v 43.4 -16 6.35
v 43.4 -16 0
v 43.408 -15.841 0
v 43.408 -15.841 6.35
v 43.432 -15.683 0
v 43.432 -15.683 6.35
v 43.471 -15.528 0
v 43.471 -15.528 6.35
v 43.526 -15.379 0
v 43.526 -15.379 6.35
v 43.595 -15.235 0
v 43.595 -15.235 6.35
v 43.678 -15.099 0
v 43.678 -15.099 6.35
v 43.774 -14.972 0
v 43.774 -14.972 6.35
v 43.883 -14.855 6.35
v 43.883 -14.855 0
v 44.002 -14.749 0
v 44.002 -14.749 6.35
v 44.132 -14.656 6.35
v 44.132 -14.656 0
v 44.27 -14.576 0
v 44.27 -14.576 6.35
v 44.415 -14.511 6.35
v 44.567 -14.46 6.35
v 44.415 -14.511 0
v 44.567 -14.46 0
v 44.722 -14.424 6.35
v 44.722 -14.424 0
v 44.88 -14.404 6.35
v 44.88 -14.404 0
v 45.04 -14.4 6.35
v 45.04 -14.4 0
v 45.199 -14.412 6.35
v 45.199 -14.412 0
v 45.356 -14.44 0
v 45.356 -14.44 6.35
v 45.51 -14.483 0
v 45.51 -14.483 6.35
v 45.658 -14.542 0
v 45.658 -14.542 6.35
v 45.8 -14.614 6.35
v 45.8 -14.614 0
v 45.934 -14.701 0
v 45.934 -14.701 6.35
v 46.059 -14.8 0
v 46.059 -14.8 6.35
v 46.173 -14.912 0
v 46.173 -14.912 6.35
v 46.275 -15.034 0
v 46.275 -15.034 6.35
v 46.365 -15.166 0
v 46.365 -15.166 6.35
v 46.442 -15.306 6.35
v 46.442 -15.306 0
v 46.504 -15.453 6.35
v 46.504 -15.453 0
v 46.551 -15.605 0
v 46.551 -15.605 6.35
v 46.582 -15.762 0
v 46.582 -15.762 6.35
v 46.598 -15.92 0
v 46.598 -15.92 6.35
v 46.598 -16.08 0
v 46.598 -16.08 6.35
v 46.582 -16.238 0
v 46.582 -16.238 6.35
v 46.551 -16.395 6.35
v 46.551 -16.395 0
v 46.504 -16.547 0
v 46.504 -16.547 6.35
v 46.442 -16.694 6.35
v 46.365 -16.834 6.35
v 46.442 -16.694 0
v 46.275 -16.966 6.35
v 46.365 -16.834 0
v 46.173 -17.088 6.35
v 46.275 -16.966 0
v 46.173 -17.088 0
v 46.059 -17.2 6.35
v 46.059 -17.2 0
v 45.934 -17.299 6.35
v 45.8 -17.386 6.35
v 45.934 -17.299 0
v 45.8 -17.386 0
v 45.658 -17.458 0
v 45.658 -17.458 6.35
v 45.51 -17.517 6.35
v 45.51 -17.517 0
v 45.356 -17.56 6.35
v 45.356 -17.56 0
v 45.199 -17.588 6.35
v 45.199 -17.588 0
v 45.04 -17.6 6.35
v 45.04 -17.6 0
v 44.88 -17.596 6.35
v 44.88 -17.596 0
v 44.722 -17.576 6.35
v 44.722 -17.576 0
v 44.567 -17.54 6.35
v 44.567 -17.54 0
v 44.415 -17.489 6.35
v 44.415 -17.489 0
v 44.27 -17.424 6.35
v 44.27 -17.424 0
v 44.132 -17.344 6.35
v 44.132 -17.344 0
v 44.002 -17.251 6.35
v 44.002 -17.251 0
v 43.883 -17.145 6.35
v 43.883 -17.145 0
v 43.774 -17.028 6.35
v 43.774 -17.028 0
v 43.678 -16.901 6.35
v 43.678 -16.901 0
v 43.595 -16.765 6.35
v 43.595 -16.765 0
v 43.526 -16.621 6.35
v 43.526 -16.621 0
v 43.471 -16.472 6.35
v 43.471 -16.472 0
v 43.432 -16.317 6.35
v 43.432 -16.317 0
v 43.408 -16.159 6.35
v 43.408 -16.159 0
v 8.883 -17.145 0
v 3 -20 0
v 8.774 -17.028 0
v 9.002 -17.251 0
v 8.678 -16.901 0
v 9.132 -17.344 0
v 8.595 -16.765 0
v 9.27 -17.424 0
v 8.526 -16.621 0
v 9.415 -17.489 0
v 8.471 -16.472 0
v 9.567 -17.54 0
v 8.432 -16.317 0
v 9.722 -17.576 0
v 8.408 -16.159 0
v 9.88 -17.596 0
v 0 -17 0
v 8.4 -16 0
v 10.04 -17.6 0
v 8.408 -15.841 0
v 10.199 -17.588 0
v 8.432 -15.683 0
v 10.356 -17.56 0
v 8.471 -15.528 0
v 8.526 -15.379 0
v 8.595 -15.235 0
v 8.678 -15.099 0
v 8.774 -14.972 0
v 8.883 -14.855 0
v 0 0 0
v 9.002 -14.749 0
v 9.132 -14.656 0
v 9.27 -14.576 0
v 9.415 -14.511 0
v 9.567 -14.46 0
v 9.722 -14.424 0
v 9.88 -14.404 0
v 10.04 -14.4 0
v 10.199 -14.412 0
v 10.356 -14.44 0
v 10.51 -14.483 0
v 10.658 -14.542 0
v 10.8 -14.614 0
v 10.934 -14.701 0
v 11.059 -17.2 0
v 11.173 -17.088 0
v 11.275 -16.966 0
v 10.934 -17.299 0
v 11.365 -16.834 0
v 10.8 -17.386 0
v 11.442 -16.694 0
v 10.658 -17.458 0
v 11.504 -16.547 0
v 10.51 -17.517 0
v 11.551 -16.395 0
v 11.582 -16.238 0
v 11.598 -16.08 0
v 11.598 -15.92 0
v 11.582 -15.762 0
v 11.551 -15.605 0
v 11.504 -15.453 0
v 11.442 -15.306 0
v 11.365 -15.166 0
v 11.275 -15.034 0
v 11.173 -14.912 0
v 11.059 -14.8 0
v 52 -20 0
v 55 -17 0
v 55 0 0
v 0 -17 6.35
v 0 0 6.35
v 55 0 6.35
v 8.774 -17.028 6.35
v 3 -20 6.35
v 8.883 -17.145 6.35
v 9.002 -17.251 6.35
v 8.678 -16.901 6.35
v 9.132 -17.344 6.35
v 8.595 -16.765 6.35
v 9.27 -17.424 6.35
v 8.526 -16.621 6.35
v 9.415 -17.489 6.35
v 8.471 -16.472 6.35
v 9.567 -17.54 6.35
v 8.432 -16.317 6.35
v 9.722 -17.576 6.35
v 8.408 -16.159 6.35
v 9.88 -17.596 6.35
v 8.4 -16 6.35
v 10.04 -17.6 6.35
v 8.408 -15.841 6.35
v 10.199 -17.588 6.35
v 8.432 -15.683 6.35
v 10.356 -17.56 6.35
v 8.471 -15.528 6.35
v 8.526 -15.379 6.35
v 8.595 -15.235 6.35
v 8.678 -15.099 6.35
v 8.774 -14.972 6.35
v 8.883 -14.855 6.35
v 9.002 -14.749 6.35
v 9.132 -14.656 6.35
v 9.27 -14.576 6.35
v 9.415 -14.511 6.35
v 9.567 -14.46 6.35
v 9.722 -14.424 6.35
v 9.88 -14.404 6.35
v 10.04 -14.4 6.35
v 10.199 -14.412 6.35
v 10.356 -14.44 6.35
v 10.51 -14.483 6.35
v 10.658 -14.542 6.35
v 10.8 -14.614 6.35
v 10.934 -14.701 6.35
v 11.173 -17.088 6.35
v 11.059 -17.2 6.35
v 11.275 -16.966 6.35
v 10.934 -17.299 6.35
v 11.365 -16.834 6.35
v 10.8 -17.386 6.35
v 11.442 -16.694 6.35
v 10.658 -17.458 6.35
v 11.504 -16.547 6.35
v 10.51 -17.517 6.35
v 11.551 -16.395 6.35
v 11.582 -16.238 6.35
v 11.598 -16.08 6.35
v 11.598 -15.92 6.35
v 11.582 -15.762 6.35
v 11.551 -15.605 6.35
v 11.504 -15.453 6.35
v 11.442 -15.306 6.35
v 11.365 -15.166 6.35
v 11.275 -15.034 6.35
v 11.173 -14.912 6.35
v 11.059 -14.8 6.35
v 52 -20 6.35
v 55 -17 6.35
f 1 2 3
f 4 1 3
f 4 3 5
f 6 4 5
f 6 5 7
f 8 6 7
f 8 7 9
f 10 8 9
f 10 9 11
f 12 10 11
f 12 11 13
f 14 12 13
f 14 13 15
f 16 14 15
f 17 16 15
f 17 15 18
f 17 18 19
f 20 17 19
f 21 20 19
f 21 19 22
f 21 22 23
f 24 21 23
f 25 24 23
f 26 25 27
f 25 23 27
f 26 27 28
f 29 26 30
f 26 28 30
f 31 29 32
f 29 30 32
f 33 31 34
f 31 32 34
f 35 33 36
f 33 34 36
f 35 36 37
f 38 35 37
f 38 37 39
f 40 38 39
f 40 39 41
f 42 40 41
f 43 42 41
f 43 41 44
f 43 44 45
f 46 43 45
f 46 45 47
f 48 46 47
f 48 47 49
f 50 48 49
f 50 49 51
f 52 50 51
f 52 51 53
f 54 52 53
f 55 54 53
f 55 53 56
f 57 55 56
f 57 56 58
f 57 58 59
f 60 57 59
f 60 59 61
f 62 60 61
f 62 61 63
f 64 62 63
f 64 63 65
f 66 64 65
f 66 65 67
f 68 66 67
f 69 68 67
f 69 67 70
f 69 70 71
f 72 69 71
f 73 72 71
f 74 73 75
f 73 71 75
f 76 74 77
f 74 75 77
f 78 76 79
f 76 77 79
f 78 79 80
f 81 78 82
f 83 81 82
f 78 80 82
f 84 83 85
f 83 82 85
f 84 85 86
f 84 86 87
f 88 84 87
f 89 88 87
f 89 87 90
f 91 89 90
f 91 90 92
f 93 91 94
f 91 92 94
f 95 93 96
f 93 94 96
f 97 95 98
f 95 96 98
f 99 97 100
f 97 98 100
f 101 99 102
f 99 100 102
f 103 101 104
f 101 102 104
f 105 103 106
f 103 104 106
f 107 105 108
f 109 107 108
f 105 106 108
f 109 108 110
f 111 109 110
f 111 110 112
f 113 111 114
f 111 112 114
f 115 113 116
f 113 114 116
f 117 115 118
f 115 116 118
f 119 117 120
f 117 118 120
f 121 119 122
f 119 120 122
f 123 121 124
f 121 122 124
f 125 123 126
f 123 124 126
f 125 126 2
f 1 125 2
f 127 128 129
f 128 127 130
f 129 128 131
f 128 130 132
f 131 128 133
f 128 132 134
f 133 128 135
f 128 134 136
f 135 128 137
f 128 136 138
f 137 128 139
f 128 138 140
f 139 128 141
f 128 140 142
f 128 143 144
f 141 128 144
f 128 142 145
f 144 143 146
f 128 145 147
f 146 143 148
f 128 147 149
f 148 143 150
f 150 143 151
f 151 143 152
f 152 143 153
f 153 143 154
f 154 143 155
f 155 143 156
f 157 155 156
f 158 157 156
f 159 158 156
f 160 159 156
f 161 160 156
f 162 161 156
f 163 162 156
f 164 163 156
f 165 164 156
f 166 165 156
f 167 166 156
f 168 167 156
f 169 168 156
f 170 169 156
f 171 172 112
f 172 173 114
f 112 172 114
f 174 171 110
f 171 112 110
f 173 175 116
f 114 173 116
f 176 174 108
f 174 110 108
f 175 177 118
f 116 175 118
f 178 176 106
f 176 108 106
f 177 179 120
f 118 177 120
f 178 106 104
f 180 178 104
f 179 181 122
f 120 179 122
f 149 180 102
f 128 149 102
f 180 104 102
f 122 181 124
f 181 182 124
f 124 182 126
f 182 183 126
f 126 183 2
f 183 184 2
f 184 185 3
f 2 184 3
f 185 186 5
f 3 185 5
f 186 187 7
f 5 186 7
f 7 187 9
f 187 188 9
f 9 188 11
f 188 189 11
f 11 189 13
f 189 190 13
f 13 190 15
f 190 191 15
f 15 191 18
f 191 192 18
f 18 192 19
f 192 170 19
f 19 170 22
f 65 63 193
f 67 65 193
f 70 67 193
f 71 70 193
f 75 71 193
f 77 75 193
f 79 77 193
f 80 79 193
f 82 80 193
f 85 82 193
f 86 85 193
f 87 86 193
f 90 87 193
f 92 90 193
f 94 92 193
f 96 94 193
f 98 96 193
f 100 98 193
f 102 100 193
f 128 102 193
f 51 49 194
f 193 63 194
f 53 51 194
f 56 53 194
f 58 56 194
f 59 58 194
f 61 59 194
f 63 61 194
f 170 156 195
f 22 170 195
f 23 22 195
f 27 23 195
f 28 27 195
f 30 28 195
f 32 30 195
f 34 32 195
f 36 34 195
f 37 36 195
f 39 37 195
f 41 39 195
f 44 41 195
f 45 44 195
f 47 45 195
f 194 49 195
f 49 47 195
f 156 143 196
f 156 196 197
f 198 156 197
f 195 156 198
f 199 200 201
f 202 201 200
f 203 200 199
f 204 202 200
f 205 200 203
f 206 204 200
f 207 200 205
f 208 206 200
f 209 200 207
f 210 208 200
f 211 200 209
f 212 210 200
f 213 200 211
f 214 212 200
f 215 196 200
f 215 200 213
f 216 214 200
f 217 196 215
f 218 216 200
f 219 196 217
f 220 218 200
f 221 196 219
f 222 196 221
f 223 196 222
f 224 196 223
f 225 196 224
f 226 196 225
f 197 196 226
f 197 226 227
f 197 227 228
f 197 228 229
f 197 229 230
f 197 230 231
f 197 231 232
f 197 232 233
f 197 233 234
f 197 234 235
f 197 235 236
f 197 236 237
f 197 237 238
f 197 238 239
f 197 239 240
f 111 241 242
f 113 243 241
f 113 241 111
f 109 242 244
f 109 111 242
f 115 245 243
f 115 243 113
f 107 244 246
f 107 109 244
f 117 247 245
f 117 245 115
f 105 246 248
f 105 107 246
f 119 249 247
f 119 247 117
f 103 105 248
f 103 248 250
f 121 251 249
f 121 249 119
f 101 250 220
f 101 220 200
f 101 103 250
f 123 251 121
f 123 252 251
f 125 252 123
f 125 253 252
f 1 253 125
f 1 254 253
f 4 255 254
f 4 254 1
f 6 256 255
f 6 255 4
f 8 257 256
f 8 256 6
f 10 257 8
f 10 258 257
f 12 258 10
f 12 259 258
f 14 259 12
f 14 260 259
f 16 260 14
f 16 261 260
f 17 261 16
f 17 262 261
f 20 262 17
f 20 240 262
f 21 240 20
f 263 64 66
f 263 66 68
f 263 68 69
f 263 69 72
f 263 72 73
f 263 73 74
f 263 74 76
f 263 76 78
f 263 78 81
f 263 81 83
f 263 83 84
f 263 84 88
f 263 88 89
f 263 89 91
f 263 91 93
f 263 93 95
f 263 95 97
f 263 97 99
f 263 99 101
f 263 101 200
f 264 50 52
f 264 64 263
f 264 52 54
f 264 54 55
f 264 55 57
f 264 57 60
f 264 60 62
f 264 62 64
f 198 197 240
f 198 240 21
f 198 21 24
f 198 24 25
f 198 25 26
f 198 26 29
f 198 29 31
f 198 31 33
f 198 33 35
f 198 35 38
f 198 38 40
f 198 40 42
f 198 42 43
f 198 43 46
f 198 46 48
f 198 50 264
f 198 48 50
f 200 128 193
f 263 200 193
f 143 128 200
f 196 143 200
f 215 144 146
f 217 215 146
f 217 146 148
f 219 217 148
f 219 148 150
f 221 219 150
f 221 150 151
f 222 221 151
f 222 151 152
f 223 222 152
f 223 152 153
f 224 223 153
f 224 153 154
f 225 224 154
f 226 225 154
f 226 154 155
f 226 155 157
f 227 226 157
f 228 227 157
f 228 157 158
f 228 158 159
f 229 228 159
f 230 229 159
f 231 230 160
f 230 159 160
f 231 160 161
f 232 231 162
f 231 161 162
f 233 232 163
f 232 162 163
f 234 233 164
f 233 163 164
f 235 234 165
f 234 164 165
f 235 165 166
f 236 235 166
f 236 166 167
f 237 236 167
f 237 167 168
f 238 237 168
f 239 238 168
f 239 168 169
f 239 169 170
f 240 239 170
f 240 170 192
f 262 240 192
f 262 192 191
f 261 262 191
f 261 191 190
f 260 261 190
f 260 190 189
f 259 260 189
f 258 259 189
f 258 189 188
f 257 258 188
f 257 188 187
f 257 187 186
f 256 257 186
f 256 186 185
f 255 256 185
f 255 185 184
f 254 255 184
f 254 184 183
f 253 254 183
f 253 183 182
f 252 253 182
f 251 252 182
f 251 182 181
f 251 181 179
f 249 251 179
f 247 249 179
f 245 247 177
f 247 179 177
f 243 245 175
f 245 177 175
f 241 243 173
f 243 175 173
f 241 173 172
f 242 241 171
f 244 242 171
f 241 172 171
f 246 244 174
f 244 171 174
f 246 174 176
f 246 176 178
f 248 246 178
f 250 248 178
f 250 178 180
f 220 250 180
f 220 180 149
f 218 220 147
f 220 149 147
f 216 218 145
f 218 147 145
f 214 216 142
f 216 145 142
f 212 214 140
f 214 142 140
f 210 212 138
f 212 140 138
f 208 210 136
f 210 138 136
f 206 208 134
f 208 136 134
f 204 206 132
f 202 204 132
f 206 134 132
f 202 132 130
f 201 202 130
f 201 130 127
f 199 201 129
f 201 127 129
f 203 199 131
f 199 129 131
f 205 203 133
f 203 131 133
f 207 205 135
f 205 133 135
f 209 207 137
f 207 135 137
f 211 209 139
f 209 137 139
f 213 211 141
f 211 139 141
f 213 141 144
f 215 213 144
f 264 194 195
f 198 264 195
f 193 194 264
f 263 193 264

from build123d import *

# Parameters (mm, degrees)
SKETCH1_W             = 55
SKETCH1_H             = 20
BOSS_EXTRUDE1_DEPTH   = 6.35
F_3_0MM_DOWEL_HOLE1_D = 3.2
CHAMFER1_SIZE         = 3


with BuildPart() as part:
    # Sketch1 → Boss-Extrude1 (new body)
    with BuildSketch(Plane.XY):
        with Locations((27.5, -10)):
            Rectangle(SKETCH1_W, SKETCH1_H)
    extrude(amount=BOSS_EXTRUDE1_DEPTH)

    # Ø3.0mm Dowel Hole1 (through all)
    with Locations(Plane.XY.offset(6.35)):
        with Locations((10, -16), (45, -16)):
            Hole(F_3_0MM_DOWEL_HOLE1_D / 2)

    # Chamfer1
    chamfer1_edges = [part.edges().sort_by_distance(p)[0] for p in [
        (55, -20, 3.175),
        (0, -20, 3.175),
    ]]
    chamfer(chamfer1_edges, length=CHAMFER1_SIZE)


solid = part.part
